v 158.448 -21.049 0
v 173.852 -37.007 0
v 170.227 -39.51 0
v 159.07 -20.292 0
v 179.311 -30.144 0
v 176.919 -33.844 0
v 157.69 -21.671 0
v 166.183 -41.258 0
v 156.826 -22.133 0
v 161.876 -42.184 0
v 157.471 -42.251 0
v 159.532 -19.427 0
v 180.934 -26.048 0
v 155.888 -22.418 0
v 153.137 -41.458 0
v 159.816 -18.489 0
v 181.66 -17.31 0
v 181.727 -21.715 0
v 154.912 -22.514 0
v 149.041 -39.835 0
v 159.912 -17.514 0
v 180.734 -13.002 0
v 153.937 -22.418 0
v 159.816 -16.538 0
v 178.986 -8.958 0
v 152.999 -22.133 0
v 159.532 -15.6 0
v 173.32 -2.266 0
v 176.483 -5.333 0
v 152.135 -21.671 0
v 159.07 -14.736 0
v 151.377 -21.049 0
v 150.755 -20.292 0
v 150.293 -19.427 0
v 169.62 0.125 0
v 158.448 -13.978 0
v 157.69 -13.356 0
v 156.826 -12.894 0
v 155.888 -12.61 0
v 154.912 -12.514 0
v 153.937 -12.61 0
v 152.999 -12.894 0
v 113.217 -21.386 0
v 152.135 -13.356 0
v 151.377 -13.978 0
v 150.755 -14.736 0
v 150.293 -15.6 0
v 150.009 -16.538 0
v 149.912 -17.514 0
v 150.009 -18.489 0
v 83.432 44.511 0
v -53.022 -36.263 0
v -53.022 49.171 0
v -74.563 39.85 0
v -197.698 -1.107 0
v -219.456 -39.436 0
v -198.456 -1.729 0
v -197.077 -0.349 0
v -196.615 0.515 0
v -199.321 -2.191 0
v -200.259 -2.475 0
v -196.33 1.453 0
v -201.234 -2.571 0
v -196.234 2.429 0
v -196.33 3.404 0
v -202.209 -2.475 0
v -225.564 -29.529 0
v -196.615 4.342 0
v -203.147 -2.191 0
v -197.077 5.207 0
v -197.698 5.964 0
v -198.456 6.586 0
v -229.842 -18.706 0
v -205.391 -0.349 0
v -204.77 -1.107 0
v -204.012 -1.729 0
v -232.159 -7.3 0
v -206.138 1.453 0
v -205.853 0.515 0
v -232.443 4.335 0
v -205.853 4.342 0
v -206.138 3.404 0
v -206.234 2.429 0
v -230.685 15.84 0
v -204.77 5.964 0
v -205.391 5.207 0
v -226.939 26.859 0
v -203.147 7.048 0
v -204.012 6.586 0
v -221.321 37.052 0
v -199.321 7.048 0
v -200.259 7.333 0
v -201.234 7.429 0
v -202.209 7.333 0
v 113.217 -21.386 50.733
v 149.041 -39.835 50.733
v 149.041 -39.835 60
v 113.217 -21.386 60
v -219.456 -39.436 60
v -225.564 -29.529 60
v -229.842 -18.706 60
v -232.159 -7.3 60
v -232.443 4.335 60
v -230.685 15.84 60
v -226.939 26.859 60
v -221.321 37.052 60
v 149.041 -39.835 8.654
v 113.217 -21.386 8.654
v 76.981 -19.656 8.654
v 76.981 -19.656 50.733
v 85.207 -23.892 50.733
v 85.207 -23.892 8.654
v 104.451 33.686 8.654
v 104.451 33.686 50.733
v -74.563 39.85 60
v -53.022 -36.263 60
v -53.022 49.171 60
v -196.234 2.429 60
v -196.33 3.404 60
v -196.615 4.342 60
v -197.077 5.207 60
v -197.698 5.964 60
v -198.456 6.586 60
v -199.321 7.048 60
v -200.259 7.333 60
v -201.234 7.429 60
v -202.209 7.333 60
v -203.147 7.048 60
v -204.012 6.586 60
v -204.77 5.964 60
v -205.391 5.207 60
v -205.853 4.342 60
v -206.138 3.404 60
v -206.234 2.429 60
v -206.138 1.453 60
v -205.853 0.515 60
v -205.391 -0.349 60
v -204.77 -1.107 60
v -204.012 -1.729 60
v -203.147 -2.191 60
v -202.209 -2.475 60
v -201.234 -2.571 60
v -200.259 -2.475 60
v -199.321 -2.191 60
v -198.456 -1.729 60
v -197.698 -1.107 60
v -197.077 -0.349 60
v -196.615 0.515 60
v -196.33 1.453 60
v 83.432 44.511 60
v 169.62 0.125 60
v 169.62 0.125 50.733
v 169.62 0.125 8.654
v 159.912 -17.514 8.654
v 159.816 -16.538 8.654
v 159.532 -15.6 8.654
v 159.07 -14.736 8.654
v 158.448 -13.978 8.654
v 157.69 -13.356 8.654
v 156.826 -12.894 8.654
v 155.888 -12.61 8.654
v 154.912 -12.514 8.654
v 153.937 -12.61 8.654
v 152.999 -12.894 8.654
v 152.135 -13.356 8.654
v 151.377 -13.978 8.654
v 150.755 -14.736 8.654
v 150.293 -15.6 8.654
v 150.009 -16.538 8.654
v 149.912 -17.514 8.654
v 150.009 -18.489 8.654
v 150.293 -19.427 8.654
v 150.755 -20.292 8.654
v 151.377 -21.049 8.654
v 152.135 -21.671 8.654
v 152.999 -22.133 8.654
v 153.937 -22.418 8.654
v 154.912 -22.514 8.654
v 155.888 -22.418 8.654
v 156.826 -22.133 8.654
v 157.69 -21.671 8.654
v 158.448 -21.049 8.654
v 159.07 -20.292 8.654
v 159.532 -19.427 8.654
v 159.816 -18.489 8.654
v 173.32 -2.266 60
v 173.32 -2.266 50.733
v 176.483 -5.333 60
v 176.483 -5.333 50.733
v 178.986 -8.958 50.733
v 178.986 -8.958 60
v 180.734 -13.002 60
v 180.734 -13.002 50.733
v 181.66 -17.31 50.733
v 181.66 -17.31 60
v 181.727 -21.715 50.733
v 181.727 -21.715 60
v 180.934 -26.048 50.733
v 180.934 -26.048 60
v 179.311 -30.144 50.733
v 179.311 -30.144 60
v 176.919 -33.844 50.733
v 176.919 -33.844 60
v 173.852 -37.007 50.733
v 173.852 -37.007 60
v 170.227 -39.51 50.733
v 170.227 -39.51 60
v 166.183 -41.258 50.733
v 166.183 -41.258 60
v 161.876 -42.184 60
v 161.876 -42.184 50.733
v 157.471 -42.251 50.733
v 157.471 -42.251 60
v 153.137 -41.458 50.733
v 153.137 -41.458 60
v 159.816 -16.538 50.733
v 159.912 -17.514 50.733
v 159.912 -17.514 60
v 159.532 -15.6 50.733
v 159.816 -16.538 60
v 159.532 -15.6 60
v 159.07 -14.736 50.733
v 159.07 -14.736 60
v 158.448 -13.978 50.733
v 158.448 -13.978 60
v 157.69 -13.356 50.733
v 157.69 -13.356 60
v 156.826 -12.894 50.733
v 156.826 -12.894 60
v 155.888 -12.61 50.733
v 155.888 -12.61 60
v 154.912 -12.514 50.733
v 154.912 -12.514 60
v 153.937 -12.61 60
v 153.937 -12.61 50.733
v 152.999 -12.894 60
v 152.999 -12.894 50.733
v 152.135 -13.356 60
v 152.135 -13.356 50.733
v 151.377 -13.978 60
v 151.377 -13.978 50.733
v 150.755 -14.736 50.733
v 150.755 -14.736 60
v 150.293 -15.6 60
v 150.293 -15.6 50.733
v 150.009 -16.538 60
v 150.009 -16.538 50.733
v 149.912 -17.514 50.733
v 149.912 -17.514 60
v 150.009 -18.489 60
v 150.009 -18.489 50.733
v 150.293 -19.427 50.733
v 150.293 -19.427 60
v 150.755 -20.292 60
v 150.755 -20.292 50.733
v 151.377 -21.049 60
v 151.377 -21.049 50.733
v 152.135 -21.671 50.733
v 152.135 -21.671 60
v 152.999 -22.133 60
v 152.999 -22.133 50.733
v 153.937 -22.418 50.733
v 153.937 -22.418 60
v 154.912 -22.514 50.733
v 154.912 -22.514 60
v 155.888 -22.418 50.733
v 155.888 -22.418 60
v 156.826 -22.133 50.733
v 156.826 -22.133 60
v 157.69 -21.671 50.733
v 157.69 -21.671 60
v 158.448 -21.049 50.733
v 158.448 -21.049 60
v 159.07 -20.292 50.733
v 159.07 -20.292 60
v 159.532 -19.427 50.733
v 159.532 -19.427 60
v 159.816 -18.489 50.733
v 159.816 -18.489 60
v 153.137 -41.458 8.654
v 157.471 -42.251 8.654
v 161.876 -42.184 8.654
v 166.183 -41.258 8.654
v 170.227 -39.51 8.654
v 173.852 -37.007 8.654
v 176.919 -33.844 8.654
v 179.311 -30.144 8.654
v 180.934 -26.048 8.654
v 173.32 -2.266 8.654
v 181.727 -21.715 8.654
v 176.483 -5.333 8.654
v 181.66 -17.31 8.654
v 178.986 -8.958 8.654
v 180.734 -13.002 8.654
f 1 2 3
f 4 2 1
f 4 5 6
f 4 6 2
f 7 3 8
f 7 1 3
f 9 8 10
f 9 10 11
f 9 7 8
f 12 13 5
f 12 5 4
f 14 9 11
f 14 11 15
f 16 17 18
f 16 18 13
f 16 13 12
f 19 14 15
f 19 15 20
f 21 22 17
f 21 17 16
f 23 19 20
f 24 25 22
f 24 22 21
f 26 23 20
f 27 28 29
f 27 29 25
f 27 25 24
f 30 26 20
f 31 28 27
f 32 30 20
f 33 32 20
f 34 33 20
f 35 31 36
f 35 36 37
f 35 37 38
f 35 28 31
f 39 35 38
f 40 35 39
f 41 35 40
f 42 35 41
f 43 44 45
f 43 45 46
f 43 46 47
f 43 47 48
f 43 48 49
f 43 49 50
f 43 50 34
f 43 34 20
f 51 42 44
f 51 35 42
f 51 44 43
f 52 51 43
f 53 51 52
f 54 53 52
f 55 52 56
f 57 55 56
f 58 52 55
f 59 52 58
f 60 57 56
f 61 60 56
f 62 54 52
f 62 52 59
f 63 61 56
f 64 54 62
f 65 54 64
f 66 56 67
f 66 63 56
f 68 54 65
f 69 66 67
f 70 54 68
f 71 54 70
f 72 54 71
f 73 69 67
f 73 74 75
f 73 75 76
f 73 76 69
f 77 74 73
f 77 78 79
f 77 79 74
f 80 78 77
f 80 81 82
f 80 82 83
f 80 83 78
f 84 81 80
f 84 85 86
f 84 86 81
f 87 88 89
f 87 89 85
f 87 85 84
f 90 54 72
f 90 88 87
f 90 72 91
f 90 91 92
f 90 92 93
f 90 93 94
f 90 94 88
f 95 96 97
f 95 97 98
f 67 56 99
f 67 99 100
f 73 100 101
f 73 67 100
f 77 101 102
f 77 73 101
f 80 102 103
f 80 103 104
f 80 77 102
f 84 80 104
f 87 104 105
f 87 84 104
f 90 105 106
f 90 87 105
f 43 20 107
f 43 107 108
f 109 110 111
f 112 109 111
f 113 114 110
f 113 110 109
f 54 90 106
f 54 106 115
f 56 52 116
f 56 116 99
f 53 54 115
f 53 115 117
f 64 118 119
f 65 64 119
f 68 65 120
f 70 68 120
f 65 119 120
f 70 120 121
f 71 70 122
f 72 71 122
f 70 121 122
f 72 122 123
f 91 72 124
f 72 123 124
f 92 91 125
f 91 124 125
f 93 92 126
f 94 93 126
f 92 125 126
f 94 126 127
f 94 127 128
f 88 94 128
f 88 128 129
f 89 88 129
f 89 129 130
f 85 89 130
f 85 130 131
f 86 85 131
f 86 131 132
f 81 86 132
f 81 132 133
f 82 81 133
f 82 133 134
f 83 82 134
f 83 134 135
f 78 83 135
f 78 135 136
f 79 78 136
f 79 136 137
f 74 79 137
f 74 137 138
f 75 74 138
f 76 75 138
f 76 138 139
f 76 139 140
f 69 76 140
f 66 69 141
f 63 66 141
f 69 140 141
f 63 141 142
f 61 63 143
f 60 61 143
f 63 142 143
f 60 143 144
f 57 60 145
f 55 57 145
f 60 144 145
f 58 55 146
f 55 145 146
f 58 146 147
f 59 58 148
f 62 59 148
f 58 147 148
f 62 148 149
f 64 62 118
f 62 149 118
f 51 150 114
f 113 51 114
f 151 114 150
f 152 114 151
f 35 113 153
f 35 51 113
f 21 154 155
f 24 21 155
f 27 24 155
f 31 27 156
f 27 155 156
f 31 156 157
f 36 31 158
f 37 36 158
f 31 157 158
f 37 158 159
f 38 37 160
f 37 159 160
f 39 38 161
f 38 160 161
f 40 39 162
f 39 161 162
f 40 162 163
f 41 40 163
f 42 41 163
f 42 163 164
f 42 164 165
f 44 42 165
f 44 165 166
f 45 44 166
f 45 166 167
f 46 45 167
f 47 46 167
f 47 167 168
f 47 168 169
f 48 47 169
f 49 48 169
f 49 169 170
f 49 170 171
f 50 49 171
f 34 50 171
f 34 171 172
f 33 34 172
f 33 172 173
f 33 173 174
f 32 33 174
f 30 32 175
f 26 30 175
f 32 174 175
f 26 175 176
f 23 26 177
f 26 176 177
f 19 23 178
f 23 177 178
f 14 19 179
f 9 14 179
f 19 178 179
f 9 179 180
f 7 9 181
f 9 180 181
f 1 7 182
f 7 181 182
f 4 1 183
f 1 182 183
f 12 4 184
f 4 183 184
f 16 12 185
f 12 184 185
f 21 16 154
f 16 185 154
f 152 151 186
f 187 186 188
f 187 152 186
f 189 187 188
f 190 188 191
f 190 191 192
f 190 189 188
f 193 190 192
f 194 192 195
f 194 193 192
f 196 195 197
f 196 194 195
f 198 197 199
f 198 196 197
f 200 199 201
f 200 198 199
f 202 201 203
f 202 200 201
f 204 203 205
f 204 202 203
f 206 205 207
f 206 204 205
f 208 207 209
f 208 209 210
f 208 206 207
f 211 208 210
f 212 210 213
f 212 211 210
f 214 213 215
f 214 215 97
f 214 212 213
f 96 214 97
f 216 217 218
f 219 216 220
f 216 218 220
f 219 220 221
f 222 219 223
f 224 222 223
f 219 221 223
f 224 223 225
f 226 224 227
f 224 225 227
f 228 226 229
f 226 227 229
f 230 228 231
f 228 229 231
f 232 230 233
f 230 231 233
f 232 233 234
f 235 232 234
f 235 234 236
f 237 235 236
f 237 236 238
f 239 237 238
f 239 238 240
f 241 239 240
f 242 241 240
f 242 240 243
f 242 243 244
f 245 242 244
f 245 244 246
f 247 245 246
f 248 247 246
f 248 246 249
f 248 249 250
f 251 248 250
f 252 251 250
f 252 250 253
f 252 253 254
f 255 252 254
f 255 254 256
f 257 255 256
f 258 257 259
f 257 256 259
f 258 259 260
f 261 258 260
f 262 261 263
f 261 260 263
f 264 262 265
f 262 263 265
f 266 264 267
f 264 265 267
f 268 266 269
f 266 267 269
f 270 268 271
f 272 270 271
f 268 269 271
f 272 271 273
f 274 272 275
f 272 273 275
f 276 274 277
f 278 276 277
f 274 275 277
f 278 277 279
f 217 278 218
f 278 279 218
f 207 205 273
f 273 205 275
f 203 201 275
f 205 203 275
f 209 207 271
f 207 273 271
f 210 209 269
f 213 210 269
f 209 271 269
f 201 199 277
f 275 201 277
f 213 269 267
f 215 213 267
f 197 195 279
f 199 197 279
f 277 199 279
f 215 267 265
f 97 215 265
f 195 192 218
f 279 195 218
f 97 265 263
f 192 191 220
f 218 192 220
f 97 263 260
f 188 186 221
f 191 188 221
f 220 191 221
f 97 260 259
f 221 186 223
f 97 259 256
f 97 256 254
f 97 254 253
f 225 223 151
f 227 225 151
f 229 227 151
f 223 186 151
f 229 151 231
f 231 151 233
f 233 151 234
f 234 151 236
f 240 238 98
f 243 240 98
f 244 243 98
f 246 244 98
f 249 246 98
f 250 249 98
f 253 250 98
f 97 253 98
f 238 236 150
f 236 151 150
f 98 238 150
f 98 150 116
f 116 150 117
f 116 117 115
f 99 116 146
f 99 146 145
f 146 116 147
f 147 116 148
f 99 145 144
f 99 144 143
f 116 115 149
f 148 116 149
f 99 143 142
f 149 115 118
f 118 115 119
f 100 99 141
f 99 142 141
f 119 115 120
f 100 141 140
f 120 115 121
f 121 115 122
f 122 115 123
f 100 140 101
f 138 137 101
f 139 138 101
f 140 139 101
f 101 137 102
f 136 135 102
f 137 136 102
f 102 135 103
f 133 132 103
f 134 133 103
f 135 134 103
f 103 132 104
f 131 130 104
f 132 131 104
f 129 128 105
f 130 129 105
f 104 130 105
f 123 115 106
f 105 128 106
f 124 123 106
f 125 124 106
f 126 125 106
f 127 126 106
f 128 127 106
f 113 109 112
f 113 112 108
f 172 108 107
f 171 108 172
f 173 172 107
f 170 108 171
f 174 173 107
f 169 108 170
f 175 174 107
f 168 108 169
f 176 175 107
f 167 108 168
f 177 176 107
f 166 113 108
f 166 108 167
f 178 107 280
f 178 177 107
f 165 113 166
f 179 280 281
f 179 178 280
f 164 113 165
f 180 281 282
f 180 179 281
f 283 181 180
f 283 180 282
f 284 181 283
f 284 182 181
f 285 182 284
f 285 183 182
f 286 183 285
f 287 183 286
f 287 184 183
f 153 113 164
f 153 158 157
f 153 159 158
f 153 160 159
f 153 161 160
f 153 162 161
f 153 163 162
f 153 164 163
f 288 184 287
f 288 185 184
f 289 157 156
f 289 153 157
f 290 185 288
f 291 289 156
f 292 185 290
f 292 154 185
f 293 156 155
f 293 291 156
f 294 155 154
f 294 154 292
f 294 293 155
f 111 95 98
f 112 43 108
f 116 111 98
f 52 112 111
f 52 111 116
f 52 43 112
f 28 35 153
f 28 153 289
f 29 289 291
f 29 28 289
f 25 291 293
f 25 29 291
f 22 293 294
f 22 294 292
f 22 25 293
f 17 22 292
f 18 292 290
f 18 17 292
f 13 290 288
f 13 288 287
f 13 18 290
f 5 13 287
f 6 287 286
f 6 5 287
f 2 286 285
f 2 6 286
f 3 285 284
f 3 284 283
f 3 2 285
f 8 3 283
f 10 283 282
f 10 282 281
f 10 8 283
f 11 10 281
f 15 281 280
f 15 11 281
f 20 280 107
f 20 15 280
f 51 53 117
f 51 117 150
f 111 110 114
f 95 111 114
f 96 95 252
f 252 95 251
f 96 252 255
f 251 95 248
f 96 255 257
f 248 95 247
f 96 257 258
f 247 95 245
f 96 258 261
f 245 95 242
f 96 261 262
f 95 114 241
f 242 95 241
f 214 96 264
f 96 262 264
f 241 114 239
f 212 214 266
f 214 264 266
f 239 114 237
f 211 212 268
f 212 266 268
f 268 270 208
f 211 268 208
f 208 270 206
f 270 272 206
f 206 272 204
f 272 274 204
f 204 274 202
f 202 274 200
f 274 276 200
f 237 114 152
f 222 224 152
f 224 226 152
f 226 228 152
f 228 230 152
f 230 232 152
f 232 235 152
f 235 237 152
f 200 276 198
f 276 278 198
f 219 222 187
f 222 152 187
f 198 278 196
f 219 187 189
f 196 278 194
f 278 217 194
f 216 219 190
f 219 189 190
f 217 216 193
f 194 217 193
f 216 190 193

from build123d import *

# Parameters (mm, degrees)
BOSS_EXTRUDE1_DEPTH = 60
SKETCH6_W           = 104.365742104
SKETCH6_H           = 42.078428343
CUT_EXTRUDE1_DEPTH  = 60
SKETCH7_R           = 5
CUT_EXTRUDE2_DEPTH  = 80
SKETCH8_R           = 5
CUT_EXTRUDE3_DEPTH  = 80


with BuildPart() as part:
    # Sketch1 → Boss-Extrude1 (new body)
    with BuildSketch(Plane.XY):
        with BuildLine():
            Line((-221.321453318, 37.052081842), (-74.563130632, 39.85043969))
            Line((-74.563130632, 39.85043969), (-53.022046647, 49.170731686))
            Line((-53.022046647, 49.170731686), (83.431852104, 44.510585688))
            Line((83.431852104, 44.510585688), (169.619936548, 0.125236974))
            ThreePointArc((169.619936548, 0.125236974), (179.310534794, -30.143946614), (149.041351206, -39.83454486))
            Line((149.041351206, -39.83454486), (113.217328202, -21.385802628))
            Line((113.217328202, -21.385802628), (-53.022046647, -36.262839488))
            Line((-53.022046647, -36.262839488), (-219.455881419, -39.436365998))
            ThreePointArc((-219.455881419, -39.436365998), (-232.557507777, -1.488943064), (-221.321453318, 37.052081842))
        make_face()
    extrude(amount=BOSS_EXTRUDE1_DEPTH)

    # Sketch6 → Cut-Extrude1 (cut)
    with BuildSketch(Plane(origin=(35.60593299, 69.14009348, 0), x_dir=(0.889035749, -0.457837785, 0), z_dir=(0.457837785, 0.889035749, 0))):
        with Locations((129.620714118, -29.693602711)):
            Rectangle(SKETCH6_W, SKETCH6_H)
    extrude(amount=-CUT_EXTRUDE1_DEPTH, mode=Mode.SUBTRACT)

    # Sketch7 → Cut-Extrude2 (cut)
    with BuildSketch(Plane.XY.offset(60)):
        with Locations((-201.23397976, 2.428743615)):
            Circle(SKETCH7_R)
    extrude(amount=-CUT_EXTRUDE2_DEPTH, mode=Mode.SUBTRACT)

    # Sketch8 → Cut-Extrude3 (cut)
    with BuildSketch(Plane.XY.offset(60)):
        with Locations((154.912488727, -17.513734237)):
            Circle(SKETCH8_R)
    extrude(amount=-CUT_EXTRUDE3_DEPTH, mode=Mode.SUBTRACT)


solid = part.part
